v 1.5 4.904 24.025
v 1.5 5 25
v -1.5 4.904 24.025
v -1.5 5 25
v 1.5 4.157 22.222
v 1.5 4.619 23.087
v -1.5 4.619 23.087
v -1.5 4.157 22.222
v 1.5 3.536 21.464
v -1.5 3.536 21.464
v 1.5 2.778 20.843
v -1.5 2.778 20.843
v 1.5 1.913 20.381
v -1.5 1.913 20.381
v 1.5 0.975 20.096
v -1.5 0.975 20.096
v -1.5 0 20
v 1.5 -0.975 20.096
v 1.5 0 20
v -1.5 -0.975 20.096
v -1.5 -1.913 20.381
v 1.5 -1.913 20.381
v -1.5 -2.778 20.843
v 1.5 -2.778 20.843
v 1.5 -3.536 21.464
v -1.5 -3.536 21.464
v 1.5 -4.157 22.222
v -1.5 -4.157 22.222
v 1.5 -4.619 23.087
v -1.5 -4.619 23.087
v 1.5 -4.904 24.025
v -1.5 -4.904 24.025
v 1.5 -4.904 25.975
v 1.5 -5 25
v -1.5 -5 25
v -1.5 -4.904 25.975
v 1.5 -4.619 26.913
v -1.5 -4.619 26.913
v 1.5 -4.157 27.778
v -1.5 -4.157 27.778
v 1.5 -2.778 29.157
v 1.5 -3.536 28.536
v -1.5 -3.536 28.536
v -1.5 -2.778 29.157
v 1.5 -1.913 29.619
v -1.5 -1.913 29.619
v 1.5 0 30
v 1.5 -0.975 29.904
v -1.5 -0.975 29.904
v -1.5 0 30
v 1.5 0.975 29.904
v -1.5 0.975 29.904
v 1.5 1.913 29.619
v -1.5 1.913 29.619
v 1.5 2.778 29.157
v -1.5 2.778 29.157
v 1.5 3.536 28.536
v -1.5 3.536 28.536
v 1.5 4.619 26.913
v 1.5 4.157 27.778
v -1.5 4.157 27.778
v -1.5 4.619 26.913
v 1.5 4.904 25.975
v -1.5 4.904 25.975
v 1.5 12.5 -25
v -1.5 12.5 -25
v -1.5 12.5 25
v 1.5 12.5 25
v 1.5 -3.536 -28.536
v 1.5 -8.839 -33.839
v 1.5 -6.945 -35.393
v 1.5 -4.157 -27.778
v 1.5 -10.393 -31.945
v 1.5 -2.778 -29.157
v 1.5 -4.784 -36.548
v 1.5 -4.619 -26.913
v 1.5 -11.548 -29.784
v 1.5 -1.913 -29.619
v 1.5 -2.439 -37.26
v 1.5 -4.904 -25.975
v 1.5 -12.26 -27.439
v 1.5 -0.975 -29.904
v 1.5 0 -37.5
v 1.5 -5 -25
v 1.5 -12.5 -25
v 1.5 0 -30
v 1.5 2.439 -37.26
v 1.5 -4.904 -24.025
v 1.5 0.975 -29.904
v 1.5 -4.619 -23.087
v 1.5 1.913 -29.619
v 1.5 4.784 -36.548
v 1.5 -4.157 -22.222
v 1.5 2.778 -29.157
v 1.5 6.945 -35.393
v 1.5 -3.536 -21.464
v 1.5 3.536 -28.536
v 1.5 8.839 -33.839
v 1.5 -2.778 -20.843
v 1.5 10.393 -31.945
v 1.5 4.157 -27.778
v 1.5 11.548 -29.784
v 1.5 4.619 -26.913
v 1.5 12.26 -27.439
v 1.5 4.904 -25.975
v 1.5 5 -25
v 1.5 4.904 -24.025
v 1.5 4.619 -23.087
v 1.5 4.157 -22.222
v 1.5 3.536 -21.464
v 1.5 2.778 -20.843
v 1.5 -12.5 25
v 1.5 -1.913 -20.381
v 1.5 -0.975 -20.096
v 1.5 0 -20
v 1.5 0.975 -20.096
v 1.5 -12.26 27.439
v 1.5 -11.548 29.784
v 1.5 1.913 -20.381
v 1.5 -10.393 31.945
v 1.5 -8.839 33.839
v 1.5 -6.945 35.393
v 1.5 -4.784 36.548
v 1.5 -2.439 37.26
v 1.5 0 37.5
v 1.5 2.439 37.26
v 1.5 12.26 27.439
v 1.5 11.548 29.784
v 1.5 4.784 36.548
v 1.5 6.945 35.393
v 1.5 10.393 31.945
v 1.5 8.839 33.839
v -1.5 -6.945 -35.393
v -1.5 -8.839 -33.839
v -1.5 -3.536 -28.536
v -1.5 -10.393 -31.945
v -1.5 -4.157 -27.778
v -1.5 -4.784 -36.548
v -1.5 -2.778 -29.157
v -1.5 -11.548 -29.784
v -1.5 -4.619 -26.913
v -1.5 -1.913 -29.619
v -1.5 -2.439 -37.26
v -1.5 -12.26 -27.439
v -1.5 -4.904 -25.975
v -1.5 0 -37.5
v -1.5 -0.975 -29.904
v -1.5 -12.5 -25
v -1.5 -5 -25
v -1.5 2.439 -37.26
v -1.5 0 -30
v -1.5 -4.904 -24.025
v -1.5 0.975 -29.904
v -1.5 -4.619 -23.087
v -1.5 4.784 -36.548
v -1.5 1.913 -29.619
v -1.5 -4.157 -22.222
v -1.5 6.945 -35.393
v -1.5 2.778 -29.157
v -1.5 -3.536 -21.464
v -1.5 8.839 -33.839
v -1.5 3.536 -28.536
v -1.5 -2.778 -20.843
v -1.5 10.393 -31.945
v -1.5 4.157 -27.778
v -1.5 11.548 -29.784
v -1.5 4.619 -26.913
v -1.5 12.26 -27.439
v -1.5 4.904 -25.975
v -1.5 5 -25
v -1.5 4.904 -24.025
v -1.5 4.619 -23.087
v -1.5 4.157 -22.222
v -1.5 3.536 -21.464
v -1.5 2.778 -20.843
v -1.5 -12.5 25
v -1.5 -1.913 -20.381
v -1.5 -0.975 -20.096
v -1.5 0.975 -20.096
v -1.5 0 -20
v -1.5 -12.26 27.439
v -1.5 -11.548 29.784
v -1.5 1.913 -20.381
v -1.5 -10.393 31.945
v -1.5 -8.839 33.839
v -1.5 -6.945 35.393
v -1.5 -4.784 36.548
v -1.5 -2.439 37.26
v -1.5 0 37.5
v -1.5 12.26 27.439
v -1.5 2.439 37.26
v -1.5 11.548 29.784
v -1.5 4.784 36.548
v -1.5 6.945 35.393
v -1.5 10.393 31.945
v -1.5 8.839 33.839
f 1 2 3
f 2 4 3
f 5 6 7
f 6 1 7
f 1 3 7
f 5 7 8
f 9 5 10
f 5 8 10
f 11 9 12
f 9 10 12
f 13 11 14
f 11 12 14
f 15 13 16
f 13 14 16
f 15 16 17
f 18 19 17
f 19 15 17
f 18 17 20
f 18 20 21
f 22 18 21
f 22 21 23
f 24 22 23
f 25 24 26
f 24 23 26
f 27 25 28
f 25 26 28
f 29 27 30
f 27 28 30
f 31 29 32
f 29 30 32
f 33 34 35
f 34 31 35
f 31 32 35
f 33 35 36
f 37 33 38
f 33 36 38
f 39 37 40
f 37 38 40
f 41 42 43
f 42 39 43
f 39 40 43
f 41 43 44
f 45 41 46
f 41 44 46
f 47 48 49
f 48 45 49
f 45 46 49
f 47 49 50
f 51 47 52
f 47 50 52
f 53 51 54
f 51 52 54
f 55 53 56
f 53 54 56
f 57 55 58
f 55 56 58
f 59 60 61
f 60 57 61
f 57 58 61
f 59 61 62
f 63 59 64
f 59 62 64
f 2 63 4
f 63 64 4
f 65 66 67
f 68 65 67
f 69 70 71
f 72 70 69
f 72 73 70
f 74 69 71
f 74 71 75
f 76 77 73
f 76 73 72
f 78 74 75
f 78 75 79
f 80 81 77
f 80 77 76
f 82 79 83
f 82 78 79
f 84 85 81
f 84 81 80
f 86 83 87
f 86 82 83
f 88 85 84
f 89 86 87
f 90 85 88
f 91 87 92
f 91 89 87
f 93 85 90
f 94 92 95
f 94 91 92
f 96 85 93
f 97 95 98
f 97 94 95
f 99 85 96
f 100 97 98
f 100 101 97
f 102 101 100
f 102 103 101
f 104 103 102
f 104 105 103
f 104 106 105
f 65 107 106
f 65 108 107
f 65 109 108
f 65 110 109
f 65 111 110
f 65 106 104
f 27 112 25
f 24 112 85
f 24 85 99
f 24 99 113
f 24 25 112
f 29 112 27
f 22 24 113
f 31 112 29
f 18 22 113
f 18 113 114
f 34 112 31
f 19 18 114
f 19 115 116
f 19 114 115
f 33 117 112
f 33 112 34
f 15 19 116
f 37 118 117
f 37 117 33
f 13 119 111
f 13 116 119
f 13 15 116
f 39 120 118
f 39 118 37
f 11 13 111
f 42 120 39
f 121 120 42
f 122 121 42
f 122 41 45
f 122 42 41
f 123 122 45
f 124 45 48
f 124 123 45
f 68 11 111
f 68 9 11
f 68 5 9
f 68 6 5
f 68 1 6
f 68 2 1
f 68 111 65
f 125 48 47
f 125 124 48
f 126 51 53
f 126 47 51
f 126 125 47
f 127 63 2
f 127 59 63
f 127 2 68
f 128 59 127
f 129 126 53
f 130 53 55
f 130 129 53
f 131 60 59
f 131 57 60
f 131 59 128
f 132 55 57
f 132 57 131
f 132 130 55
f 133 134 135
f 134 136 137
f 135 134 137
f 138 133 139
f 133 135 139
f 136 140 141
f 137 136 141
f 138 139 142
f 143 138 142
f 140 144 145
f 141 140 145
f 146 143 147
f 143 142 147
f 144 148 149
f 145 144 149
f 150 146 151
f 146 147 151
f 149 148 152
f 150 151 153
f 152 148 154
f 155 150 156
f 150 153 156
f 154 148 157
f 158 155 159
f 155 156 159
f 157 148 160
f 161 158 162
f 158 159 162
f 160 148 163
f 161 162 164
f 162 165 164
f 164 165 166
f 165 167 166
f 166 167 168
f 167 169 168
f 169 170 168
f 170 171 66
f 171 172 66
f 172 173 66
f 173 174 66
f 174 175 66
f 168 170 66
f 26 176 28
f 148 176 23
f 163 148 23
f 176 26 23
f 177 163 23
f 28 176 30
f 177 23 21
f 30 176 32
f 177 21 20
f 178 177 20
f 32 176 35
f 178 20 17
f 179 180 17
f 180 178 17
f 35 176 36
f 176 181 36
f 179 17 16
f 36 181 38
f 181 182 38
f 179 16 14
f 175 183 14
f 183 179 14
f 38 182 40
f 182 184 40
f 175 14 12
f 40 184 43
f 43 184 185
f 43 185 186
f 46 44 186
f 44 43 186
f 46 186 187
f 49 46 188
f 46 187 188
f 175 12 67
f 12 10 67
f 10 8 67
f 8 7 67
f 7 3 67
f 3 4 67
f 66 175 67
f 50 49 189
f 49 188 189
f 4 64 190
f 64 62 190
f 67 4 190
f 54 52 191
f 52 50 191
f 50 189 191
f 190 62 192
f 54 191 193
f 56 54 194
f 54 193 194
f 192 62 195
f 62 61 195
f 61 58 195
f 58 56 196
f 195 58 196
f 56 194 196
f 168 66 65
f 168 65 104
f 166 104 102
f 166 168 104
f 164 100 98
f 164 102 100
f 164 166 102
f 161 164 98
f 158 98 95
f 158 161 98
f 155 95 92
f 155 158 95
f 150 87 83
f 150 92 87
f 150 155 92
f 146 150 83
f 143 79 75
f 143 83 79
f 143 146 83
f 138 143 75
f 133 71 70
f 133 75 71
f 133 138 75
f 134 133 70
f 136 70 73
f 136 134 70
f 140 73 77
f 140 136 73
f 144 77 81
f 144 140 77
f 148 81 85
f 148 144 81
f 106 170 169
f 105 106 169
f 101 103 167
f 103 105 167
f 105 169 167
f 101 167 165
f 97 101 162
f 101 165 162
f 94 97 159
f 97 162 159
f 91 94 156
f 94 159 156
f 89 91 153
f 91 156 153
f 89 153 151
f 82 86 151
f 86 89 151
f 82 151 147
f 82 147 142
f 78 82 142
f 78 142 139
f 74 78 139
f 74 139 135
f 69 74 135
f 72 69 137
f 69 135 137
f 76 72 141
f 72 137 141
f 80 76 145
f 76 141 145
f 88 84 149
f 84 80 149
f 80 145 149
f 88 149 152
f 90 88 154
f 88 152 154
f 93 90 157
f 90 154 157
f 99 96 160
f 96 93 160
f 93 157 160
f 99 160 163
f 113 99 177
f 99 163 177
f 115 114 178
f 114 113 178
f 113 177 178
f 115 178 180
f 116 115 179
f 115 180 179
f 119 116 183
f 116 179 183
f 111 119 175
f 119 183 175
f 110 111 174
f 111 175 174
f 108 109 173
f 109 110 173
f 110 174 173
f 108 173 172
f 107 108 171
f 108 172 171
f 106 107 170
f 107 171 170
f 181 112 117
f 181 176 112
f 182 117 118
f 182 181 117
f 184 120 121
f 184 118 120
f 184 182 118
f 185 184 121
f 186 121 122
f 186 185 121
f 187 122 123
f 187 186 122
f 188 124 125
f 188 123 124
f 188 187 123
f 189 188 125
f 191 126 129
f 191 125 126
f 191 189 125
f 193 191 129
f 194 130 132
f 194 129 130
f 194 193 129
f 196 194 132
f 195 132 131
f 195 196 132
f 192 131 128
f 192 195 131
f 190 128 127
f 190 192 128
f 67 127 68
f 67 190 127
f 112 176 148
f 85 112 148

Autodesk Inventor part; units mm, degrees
ref_plane "YZ Plane" through (0, 0, 0) normal (1, 0, 0) x (0, 1, 0)
ref_plane "XZ Plane" through (0, 0, 0) normal (0, 1, 0) x (-1, 0, 0)
ref_plane "XY Plane" through (0, 0, 0) normal (0, 0, 1) x (1, 0, 0)
sketch "Sketch1" plane through (0, 0, 0) normal (1, 0, 0) x (0, 1, 0)
  line L0 (0, -25) -> (0, 25) construction
  line L1 (12.5, -25) -> (12.5, 25)
  line L2 (-12.5, 25) -> (-12.5, -25)
  arc A0 (-12.5, -25) -> (12.5, -25) centre (0, -25) ccw
  arc A1 (12.5, 25) -> (-12.5, 25) centre (0, 25) ccw
  line L3 (23.5288, 0) -> (-21.155, 0)
  circle A2 centre (0, 25) radius 5
  circle A3 centre (0, -25) radius 5
  point P0 (0, 0)
  dimension "d1" = 25
  dimension "d15" = 10
  dimension "d16" = 50
extrude "Extrusion1" add sketch "Sketch1" along normal mid plane 3
properties part number "joint"
